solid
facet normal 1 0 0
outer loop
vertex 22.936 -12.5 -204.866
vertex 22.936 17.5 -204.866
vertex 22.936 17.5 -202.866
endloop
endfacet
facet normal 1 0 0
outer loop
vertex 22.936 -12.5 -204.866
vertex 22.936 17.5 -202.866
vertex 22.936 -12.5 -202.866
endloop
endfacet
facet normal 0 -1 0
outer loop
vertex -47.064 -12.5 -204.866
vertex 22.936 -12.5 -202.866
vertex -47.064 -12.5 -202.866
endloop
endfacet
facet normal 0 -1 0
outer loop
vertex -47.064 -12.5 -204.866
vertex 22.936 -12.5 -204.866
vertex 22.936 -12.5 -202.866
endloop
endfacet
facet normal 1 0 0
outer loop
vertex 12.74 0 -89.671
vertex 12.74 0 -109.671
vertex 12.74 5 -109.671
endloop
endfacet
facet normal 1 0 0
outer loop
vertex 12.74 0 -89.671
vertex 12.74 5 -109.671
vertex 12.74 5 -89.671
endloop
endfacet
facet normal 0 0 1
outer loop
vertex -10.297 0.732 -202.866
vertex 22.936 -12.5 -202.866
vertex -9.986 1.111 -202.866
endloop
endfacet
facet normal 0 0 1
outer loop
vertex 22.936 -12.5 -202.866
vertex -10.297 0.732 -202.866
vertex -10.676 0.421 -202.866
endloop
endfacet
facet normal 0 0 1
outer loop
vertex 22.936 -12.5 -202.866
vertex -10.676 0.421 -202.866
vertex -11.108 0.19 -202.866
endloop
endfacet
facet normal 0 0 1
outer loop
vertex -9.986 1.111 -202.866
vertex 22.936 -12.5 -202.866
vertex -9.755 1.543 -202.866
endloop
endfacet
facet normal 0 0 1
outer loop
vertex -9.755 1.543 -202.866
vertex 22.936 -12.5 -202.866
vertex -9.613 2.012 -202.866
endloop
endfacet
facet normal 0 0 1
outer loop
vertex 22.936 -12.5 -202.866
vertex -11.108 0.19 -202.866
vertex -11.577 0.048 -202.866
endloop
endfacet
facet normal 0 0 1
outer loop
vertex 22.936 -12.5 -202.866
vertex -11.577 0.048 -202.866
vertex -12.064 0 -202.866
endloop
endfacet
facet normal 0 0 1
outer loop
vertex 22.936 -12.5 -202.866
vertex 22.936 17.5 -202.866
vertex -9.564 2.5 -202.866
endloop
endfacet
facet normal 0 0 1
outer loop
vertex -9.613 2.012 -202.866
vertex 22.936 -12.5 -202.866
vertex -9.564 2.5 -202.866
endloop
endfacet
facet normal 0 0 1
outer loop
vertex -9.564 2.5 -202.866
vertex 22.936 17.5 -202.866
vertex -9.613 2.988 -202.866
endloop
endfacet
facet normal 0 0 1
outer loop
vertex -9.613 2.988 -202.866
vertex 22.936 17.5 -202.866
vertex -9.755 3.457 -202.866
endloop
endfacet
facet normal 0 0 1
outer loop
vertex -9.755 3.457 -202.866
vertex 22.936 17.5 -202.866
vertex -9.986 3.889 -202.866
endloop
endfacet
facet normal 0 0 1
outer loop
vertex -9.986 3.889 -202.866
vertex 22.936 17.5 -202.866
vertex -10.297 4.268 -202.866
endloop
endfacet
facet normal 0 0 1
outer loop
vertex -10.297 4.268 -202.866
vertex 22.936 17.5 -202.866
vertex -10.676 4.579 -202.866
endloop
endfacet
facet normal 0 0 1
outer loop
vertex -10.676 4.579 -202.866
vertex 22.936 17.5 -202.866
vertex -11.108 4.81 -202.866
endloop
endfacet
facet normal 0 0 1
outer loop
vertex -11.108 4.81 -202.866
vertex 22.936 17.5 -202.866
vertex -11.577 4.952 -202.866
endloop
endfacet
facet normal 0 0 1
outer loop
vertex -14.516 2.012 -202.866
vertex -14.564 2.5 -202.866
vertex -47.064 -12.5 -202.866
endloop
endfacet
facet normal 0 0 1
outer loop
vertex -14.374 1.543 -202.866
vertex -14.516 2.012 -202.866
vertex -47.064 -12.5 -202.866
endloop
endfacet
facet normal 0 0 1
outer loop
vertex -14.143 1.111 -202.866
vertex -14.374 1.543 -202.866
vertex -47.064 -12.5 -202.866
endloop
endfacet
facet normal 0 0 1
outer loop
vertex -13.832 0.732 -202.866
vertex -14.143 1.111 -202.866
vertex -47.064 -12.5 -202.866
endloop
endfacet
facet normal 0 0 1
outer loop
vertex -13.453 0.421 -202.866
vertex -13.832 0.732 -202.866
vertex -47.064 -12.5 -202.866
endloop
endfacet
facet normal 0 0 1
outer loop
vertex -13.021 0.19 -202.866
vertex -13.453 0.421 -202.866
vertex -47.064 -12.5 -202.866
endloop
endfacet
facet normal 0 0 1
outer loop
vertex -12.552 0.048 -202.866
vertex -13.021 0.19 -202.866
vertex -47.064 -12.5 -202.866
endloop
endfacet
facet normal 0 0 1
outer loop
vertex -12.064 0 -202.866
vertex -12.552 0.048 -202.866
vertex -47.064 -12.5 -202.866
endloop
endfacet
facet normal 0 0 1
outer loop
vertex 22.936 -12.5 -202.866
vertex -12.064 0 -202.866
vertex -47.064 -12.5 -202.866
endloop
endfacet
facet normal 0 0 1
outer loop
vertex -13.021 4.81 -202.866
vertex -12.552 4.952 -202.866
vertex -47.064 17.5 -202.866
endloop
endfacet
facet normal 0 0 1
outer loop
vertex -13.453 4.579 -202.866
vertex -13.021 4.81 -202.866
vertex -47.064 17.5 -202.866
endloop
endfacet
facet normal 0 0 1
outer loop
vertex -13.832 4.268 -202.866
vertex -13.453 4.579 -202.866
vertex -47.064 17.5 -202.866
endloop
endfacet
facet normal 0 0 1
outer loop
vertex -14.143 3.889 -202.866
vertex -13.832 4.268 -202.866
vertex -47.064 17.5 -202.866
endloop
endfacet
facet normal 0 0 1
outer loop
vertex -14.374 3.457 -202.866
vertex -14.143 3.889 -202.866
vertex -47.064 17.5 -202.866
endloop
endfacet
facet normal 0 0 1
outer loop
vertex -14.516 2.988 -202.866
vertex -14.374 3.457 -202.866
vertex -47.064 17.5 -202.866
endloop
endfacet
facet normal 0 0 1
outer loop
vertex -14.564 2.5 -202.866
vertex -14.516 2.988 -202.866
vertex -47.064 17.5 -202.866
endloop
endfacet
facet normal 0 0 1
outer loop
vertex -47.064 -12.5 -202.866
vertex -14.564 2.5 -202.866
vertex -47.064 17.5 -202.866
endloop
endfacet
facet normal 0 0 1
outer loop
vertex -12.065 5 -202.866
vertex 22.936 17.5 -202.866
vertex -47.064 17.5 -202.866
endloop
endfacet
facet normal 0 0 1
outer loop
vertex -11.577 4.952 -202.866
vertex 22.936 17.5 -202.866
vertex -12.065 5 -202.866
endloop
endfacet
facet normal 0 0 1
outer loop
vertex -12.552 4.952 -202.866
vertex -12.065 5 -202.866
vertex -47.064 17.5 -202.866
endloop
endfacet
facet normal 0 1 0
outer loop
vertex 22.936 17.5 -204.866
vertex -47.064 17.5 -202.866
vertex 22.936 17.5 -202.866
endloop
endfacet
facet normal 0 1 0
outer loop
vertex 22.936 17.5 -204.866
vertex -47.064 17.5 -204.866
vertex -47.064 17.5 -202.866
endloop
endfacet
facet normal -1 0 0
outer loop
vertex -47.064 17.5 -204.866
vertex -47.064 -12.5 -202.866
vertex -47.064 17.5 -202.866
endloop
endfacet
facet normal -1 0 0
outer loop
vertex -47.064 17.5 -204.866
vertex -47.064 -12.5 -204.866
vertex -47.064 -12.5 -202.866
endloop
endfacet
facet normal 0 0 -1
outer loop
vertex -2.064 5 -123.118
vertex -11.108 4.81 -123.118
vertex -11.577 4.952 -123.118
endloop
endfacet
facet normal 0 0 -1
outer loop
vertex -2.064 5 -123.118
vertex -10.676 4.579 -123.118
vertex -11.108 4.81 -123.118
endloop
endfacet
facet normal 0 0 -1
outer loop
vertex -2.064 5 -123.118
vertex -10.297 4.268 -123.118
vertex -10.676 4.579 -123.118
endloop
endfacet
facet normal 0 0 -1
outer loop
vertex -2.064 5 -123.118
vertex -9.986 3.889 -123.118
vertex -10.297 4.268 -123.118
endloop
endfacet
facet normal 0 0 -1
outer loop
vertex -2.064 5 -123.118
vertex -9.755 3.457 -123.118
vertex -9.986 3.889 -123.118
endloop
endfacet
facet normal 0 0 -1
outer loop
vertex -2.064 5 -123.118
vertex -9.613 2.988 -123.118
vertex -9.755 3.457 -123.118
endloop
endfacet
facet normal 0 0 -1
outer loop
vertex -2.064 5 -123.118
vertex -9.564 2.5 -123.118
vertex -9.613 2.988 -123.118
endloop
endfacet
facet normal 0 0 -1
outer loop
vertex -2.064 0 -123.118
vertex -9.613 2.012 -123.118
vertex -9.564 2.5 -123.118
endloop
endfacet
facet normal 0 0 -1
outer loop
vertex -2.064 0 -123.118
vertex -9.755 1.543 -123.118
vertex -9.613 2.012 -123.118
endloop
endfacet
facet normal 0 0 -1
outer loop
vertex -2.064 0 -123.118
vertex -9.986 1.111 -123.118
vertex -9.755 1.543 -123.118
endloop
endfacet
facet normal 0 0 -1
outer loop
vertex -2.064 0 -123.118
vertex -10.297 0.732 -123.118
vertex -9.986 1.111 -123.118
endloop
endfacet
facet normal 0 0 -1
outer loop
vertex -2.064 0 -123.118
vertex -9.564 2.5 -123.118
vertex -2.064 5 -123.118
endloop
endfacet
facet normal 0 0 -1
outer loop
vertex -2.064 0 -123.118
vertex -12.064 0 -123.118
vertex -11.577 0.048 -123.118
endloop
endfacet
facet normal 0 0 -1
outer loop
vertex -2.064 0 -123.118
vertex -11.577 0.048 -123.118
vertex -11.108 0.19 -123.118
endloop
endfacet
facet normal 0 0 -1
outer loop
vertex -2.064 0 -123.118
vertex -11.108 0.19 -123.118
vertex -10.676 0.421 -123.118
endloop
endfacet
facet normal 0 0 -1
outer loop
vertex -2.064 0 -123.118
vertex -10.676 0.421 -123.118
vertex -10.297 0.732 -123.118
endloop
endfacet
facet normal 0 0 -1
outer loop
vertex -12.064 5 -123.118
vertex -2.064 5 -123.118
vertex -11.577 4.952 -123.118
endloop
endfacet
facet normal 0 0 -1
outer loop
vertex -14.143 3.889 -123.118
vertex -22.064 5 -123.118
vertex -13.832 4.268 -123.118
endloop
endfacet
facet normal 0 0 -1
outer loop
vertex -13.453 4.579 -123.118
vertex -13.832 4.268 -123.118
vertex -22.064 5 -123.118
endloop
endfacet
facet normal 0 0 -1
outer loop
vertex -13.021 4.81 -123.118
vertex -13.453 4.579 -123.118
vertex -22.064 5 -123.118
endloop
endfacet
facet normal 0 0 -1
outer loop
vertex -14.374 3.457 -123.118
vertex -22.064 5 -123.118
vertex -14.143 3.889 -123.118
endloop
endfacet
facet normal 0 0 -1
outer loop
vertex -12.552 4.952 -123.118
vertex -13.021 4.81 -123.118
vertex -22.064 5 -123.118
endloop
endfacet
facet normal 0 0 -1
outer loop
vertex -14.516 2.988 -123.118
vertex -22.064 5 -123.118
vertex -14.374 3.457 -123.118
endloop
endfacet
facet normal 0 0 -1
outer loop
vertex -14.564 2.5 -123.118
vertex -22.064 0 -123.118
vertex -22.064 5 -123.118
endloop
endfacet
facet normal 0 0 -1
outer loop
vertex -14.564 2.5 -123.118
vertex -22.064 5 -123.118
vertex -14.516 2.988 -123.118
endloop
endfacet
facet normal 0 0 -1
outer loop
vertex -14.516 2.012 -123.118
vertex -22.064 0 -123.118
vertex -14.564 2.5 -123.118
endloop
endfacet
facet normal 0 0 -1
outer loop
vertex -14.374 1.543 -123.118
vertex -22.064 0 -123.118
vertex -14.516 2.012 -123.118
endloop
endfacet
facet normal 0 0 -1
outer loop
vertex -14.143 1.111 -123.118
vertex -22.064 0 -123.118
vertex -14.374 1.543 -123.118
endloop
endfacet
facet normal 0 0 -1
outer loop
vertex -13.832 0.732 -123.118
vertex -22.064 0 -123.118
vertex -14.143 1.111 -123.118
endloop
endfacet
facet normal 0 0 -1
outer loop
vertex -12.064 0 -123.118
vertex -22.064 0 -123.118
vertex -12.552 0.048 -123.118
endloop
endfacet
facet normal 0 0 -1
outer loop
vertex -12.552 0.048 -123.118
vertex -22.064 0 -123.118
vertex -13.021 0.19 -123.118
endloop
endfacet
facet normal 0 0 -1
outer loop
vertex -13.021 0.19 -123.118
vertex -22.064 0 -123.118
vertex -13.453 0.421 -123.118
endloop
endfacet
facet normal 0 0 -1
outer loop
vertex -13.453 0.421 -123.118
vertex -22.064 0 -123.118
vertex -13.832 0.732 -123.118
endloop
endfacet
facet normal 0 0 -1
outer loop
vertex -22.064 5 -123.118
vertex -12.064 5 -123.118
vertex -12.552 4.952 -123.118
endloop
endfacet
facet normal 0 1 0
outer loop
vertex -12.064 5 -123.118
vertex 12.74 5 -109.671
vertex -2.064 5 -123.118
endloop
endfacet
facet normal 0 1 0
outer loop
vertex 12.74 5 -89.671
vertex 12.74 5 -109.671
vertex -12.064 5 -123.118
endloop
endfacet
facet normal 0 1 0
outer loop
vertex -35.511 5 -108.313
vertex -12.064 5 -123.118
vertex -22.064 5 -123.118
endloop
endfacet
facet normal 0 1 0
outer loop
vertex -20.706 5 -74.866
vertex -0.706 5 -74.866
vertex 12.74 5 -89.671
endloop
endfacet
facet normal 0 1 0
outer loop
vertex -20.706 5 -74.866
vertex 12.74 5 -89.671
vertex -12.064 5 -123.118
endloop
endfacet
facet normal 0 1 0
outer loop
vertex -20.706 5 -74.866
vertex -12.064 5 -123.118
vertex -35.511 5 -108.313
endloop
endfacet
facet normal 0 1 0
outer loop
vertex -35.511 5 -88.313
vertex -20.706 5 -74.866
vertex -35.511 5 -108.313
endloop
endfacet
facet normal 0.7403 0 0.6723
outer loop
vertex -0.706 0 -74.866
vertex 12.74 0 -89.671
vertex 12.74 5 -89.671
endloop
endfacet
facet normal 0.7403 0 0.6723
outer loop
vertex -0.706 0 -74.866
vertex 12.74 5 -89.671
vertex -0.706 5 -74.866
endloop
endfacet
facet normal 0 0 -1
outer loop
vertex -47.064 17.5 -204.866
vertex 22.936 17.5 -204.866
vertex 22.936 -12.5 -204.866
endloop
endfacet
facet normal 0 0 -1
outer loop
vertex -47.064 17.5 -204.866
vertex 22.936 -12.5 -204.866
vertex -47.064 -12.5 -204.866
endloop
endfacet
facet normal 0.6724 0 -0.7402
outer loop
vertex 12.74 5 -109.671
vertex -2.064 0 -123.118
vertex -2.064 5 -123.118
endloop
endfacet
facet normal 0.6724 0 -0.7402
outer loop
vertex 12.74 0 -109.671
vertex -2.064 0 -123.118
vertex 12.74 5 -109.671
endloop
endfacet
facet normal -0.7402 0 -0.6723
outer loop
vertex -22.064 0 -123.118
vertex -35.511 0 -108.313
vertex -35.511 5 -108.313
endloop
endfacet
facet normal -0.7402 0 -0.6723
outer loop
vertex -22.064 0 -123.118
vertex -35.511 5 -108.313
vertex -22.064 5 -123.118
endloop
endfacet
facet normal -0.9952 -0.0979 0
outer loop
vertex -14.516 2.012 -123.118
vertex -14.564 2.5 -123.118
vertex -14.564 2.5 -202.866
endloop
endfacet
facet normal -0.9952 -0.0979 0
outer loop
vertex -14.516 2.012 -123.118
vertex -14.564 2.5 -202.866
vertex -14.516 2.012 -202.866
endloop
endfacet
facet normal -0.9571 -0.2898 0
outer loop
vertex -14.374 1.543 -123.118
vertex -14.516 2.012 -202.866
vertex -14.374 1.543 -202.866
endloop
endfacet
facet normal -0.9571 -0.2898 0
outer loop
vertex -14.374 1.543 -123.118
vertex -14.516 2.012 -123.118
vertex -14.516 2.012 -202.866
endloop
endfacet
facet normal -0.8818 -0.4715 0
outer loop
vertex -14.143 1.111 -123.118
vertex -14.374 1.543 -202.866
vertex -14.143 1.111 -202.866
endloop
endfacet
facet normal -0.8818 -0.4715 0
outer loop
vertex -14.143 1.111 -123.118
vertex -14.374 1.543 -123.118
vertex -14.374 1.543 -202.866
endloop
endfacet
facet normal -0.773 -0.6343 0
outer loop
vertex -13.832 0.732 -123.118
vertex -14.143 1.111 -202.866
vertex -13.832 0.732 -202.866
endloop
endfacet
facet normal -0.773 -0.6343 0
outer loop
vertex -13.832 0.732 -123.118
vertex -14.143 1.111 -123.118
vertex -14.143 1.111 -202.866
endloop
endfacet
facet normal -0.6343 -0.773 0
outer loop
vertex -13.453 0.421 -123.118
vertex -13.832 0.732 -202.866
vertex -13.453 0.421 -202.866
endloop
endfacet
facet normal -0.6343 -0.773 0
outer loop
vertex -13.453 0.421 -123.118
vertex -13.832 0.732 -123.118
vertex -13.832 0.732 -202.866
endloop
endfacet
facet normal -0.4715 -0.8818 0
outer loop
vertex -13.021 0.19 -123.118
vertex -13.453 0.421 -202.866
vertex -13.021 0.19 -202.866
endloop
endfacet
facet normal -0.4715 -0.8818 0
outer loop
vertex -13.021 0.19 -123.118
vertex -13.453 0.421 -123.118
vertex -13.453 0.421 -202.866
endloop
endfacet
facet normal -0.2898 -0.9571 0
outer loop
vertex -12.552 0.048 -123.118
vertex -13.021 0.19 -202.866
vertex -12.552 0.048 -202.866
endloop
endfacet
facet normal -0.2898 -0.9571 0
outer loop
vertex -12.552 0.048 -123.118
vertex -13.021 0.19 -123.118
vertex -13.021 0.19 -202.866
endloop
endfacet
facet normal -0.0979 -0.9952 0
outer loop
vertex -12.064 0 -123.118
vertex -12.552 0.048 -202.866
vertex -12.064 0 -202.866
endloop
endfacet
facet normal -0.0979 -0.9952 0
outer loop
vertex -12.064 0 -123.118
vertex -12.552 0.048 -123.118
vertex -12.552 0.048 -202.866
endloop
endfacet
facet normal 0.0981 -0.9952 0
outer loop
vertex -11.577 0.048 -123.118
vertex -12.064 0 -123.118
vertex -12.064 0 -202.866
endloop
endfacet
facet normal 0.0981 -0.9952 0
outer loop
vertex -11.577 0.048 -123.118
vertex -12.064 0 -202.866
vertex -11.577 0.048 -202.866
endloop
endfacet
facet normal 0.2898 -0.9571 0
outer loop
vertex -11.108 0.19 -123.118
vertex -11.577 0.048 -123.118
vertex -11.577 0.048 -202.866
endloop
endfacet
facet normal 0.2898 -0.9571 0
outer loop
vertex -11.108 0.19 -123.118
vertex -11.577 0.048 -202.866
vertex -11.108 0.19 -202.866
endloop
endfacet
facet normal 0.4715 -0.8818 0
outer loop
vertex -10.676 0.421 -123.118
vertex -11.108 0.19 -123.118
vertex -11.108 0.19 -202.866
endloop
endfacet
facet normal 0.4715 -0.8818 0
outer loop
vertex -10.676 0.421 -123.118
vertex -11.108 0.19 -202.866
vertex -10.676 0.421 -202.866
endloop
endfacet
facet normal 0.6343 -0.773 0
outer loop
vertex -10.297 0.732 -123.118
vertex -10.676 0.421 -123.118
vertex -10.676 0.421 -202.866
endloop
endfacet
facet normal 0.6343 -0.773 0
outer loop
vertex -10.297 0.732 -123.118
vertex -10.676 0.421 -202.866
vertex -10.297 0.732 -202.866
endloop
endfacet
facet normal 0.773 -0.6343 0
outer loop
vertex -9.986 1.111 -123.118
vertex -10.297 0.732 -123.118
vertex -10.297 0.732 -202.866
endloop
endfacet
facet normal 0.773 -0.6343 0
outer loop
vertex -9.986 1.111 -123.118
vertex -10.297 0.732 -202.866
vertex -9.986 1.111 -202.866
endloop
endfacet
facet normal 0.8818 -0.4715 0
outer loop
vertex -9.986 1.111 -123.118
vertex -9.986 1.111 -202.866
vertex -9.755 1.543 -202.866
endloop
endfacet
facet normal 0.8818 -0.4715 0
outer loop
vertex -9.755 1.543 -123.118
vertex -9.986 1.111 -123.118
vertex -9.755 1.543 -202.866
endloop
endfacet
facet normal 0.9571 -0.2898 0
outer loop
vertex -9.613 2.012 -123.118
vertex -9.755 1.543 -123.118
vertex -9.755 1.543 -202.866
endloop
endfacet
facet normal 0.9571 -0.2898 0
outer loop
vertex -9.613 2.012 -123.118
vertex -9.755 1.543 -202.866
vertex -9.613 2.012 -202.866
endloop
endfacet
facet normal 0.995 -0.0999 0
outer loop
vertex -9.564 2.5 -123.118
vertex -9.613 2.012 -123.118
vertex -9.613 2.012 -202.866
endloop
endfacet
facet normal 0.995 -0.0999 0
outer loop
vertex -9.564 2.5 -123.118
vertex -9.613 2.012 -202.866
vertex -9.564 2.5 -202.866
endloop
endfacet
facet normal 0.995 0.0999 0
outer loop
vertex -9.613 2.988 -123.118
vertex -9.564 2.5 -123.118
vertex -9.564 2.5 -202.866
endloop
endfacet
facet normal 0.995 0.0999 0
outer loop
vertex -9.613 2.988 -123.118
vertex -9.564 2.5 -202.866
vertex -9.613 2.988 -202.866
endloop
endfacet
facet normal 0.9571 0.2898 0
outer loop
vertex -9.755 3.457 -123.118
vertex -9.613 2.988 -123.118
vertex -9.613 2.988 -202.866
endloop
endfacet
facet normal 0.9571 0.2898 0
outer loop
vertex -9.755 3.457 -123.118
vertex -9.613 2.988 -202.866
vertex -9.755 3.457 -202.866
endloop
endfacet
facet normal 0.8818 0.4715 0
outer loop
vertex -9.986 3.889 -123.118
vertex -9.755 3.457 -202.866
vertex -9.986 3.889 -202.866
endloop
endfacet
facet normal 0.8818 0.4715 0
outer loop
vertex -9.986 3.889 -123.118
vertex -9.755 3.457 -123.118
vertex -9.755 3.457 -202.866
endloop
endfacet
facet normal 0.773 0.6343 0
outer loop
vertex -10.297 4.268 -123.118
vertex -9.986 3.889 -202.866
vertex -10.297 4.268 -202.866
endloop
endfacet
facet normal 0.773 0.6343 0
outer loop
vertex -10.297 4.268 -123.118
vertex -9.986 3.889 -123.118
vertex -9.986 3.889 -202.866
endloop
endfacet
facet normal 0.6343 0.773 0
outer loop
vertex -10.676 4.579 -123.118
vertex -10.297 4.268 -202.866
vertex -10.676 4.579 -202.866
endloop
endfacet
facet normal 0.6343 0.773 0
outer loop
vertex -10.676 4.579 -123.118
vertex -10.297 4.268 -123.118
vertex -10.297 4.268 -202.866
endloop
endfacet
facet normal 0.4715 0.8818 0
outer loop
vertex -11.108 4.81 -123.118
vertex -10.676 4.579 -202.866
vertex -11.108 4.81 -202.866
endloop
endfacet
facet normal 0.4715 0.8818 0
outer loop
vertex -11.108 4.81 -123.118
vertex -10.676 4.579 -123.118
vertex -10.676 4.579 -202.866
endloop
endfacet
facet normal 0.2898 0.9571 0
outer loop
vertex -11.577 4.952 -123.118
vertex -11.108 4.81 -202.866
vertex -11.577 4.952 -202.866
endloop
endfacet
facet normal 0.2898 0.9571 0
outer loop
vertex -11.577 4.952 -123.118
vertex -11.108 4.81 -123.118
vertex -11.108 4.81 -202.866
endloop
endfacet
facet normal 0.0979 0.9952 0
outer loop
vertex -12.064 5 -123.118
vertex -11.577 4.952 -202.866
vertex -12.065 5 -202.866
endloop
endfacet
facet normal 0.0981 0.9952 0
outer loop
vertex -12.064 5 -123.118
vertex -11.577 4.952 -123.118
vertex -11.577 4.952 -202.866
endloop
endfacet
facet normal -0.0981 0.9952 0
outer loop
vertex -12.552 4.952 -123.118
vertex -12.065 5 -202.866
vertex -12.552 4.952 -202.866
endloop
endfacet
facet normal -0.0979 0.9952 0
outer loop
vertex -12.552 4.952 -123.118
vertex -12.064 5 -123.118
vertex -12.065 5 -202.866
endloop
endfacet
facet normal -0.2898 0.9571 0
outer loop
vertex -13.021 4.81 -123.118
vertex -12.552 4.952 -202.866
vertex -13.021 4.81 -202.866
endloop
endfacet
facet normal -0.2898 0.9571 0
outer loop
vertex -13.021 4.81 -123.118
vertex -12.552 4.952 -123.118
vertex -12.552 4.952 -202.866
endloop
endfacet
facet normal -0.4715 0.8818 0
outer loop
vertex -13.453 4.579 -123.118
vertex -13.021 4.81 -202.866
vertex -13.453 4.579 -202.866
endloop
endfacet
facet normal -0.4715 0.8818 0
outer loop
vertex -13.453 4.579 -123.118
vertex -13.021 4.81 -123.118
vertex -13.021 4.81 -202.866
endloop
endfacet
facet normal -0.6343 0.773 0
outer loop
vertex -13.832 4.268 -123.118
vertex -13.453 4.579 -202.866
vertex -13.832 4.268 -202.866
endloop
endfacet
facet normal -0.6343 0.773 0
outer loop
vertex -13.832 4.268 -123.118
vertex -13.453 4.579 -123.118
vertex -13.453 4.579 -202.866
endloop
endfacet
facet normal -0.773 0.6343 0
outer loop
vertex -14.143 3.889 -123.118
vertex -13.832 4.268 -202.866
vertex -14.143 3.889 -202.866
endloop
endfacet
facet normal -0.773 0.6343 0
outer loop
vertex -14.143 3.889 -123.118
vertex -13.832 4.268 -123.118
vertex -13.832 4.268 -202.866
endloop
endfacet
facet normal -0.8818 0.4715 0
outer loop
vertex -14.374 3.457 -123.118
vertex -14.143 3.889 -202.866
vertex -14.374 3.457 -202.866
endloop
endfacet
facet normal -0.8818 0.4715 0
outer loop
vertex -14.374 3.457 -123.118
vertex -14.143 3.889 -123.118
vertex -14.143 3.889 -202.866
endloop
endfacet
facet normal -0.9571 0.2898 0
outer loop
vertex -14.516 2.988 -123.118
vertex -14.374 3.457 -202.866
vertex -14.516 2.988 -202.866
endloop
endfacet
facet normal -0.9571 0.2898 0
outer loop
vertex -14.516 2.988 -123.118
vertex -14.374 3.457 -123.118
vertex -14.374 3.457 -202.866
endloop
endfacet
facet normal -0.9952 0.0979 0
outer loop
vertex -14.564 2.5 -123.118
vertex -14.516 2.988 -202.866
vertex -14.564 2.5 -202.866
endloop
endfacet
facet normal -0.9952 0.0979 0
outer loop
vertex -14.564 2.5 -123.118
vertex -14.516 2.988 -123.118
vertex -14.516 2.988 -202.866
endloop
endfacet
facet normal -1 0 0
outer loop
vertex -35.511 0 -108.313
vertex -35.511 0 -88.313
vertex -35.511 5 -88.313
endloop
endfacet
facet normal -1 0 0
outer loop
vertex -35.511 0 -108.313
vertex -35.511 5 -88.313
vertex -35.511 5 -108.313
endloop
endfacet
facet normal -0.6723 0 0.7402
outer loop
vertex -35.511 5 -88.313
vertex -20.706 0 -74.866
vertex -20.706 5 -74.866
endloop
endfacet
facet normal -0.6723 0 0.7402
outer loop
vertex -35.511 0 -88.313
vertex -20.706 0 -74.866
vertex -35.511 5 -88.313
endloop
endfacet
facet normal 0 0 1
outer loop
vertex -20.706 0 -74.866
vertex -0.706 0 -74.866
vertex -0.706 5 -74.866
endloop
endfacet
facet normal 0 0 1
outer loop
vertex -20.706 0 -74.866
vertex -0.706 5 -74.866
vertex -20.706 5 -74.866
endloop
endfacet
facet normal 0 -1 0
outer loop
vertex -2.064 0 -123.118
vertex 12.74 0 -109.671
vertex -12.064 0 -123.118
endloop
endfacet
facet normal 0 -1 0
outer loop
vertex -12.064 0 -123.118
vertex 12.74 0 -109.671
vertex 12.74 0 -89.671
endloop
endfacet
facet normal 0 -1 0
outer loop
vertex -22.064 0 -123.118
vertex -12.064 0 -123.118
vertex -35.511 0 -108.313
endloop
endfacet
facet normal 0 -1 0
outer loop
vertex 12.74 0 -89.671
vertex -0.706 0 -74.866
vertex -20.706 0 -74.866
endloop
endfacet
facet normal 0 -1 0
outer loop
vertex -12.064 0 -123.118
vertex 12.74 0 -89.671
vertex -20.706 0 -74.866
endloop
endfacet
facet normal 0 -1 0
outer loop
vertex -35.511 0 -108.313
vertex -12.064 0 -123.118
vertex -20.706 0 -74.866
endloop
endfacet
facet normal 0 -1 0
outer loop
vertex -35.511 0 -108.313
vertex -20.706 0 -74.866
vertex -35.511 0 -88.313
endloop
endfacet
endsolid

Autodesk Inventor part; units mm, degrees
ref_plane "YZ Plane" through (0, 0, 0) normal (1, 0, 0) x (0, 1, 0)
ref_plane "XZ Plane" through (0, 0, 0) normal (0, 1, 0) x (-1, 0, 0)
ref_plane "XY Plane" through (0, 0, 0) normal (0, 0, 1) x (1, 0, 0)
sketch "Skizze1" plane through (0, 0, 0) normal (0, 1, 0) x (-1, 0, 0)
  line L0 (35.5112, -88.3128) -> (35.5112, -108.3128)
  line L1 (35.5112, -108.3128) -> (22.0645, -123.1178)
  line L2 (22.0645, -123.1178) -> (2.0645, -123.1178)
  line L3 (2.0645, -123.1178) -> (-12.7404, -109.6711)
  line L4 (-12.7404, -109.6711) -> (-12.7404, -89.6711)
  line L5 (-12.7404, -89.6711) -> (0.7063, -74.8661)
  line L6 (0.7063, -74.8661) -> (20.7063, -74.8661)
  line L7 (20.7063, -74.8661) -> (35.5112, -88.3128)
  point P0 (0, 0)
  dimension "d0" = 20
  dimension "d1" = 20
  dimension "d2" = 20
  dimension "d3" = 20
  dimension "d4" = 20
  dimension "d5" = 20
  dimension "d6" = 20
  dimension "d7" = 20
extrude "Extrusion1" add sketch "Skizze1" along normal blind 5
sketch "Skizze2" plane through (-2.0645, 0, -123.1178) normal (0, 0, -1) x (-1, 0, 0)
  circle A0 centre (10, 2.5) radius 2.5
  line L0 (0, 5) -> (20, 5) projected
  point P0 (-2.0645, 0)
  dimension "d11" = 5
  dimension "d12" = 2.5
extrude "Extrusion2" add sketch "Skizze2" along normal blind 81.748
sketch "Skizze3" plane through (-12.0645, 2.5, -204.8658) normal (0, 0, -1) x (-1, 0, 0)
  line L0 (-35, -15) -> (35, -15)
  line L1 (35, -15) -> (35, 15)
  line L2 (35, 15) -> (-35, 15)
  line L3 (-35, 15) -> (-35, -15)
  arc A0 (0, -2.5) -> (0, 2.5) centre (0, 0) ccw projected
  line L4 (-35, -15) -> (35, 15) construction
  line L5 (35, -15) -> (-35, 15) construction
  point P0 (-12.0645, -2.5)
  point P1 (-2.7951, -2.5)
  point P2 (-2.7951, 2.5)
  dimension "d15" = 70
  dimension "d16" = 30
extrude "Extrusion3" add sketch "Skizze3" against normal blind 2
properties part number "Stoppschild"
